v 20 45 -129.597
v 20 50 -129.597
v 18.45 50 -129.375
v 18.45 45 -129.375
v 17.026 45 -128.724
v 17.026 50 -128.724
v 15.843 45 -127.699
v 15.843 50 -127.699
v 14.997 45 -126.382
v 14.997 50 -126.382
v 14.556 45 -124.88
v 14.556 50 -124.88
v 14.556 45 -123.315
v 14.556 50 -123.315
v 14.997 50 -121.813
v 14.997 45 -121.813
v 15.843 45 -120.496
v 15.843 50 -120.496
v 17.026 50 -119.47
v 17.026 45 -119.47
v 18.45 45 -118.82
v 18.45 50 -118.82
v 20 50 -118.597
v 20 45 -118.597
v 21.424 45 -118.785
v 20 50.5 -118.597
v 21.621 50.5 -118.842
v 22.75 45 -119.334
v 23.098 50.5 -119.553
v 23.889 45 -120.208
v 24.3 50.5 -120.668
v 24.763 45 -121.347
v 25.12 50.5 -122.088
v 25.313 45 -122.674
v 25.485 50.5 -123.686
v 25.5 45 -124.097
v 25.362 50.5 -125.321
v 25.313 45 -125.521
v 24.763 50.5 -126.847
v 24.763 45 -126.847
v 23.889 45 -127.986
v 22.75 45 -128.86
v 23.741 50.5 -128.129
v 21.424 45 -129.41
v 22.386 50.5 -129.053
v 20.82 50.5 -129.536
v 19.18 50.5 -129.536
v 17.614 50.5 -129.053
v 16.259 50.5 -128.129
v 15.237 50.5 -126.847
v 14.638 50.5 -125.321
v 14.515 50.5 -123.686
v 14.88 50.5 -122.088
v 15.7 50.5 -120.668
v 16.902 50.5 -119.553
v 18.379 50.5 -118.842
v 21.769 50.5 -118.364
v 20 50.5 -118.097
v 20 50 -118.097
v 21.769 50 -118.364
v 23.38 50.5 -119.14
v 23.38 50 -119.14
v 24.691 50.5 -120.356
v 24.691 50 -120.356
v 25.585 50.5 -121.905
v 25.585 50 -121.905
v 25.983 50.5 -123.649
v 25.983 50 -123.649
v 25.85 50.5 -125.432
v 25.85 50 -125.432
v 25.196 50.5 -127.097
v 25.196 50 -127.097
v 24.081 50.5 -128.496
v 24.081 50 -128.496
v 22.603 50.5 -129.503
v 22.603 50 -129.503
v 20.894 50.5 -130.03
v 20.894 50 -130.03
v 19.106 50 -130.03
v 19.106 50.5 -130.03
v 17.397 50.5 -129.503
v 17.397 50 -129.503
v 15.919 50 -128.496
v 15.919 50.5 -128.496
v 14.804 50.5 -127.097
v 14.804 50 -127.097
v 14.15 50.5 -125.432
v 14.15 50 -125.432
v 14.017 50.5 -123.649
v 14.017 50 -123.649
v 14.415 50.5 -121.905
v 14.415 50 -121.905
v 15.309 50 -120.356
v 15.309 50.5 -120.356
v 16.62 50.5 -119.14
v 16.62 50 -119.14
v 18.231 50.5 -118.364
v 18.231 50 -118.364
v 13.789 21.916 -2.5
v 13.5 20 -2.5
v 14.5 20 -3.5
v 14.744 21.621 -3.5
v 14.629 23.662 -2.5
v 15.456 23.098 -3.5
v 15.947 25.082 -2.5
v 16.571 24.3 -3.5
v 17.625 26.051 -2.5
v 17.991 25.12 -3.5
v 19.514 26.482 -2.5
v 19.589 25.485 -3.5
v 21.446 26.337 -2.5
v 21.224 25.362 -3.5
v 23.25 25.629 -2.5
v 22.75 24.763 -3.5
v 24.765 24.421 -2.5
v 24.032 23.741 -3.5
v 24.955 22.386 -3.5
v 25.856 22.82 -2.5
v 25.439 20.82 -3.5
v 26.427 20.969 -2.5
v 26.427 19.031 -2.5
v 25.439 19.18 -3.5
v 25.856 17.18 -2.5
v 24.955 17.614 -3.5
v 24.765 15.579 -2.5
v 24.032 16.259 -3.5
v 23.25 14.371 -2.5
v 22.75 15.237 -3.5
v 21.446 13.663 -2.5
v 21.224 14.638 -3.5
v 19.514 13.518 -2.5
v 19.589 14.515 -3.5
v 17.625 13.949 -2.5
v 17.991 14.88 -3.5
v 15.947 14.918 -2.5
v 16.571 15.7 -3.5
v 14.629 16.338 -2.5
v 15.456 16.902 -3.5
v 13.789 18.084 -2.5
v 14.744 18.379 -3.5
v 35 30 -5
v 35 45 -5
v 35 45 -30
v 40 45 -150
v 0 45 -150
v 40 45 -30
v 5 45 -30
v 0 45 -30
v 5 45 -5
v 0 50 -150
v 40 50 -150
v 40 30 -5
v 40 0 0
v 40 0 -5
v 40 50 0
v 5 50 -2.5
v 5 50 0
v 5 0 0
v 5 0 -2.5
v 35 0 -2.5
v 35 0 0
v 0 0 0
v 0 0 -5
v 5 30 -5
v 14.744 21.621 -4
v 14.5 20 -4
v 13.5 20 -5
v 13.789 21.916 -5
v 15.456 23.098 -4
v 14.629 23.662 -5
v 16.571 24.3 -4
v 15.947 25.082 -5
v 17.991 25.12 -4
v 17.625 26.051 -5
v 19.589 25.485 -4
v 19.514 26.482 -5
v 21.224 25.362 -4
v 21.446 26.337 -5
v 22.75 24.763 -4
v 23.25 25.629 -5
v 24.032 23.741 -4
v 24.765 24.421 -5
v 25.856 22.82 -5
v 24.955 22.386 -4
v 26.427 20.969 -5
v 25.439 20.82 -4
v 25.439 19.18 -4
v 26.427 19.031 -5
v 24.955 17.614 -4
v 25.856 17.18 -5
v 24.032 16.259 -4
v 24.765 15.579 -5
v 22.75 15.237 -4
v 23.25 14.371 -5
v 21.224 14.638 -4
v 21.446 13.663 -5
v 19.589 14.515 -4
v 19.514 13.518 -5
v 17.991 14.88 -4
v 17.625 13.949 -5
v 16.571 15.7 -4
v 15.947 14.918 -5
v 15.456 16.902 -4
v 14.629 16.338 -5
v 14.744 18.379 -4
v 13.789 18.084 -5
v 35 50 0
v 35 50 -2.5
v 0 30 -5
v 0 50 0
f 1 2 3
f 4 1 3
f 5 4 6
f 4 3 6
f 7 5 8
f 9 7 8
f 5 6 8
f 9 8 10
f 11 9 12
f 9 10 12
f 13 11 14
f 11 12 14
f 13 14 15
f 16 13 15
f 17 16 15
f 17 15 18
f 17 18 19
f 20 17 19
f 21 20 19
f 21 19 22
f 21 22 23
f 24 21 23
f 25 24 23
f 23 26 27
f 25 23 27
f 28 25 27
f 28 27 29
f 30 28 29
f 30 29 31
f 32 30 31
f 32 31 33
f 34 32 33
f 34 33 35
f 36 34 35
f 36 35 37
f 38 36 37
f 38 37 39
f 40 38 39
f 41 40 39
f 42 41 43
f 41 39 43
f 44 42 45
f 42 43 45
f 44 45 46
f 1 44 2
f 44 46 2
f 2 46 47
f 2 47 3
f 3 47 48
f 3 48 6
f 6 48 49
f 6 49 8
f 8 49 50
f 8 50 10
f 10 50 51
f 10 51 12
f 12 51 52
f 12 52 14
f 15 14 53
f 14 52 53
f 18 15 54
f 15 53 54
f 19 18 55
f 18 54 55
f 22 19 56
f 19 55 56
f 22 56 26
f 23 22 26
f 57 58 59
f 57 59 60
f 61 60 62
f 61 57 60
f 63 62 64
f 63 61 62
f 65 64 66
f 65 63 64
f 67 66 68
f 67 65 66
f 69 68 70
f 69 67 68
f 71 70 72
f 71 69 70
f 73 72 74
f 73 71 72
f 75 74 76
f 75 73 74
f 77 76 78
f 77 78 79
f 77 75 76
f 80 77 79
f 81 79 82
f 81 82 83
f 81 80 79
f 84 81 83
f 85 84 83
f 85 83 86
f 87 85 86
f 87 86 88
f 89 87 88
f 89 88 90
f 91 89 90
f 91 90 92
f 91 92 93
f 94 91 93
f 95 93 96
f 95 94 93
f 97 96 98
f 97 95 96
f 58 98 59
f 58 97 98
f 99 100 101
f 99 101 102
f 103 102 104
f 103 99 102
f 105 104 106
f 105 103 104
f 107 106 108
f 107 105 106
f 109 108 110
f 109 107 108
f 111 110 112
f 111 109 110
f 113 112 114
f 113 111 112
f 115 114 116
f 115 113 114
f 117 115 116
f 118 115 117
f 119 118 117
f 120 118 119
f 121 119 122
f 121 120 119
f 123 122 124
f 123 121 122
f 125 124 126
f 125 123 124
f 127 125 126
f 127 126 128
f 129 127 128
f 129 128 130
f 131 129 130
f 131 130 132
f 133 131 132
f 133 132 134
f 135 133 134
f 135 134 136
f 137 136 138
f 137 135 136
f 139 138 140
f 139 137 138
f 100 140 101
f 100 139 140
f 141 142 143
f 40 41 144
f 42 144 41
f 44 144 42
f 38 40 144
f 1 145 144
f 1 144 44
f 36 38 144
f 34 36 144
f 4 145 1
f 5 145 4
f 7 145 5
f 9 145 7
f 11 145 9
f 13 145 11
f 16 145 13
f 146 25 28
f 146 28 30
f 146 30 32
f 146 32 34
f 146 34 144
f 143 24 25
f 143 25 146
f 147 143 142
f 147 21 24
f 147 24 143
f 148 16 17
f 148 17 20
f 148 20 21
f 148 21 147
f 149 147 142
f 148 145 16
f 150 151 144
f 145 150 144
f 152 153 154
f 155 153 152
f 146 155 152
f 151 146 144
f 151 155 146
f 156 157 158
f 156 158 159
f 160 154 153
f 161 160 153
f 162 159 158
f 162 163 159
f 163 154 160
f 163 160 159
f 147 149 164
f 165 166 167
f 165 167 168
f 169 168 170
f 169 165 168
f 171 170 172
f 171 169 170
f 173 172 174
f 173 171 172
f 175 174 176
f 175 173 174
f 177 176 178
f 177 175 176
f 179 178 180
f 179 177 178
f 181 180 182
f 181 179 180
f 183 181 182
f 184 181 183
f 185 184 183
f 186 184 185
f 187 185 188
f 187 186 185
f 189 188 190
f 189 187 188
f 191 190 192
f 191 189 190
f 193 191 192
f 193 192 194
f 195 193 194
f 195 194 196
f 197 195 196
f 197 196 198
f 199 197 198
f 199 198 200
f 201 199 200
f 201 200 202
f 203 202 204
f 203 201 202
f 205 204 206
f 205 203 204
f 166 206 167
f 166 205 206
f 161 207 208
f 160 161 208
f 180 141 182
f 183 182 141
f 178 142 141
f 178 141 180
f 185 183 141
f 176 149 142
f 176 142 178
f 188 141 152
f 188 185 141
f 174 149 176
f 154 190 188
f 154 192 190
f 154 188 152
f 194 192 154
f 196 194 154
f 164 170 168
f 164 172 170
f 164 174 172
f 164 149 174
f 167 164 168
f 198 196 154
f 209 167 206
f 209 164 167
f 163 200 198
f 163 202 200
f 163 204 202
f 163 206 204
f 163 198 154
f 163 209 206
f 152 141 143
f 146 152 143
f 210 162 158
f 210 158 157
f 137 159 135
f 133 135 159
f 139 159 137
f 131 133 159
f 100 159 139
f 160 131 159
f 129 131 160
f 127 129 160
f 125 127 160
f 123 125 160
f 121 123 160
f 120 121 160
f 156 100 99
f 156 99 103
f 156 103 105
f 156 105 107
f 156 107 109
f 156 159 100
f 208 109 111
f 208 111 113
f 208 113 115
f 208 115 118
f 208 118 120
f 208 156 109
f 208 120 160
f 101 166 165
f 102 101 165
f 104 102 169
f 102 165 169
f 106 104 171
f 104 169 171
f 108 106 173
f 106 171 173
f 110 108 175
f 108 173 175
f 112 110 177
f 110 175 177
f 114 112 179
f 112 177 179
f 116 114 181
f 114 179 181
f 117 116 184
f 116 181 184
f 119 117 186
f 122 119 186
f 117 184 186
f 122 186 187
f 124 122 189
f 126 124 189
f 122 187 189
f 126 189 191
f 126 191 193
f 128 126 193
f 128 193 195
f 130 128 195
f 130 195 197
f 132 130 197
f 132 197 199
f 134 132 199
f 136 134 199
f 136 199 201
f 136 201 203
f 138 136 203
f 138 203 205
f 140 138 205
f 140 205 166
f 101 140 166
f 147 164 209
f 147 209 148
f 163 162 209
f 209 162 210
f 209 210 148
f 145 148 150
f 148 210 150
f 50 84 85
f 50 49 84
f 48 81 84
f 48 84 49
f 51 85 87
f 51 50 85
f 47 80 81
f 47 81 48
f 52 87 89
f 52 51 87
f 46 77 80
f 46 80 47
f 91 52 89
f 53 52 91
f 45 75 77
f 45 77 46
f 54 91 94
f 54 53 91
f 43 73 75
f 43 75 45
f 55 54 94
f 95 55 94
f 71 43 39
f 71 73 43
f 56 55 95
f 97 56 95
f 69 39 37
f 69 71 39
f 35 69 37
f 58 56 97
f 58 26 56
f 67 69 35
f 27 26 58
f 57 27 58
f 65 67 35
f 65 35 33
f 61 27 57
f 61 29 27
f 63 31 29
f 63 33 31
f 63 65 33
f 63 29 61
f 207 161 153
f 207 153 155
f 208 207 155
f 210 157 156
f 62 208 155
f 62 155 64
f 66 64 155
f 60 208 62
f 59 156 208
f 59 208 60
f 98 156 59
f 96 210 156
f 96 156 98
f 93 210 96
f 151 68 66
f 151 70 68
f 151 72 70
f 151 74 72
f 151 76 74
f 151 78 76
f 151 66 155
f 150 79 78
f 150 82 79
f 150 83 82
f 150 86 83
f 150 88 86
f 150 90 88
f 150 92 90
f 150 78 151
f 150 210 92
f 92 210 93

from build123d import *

# Parameters (mm, degrees)
DODANIE_WYCI_GNI_CIE1_DEPTH = 40
SZKIC2_W                    = 30
SZKIC2_H                    = 2.5
WYTNIJ_WYCI_GNI_CIE1_DEPTH  = 164.095064303
EBRO3_START                 = -5
EBRO3_DEPTH                 = 5
SZKIC4_R                    = 5.5
WYTNIJ_WYCI_GNI_CIE2_DEPTH  = 10
SFAZOWANIE1_SIZE            = 1
WYTNIJ_WYCI_GNI_CIE3_DEPTH  = 10
DODANIE_WYCI_GNI_CIE2_START = 0.5
SZKIC6_R                    = 6
SZKIC6_R_2                  = 5.5
DODANIE_WYCI_GNI_CIE2_DEPTH = 0.5


# Read off the part's stored shape, not the designer's step: Żebro3
with BuildPart() as part:
    # Szkic1 → Dodanie-wyciągnięcie1 (new body)
    with BuildSketch(Plane(origin=(0, 0, 0), x_dir=(0, 0, -1), z_dir=(1, 0, 0))):
        Polygon((0, 0), (0, 50), (150, 50), (150, 45), (5, 45), (5, 0), align=None)
    extrude(amount=DODANIE_WYCI_GNI_CIE1_DEPTH)

    # Szkic2 → Wytnij-wyciągnięcie1 (cut, through all)
    with BuildSketch(Plane(origin=(0, 50, 0), x_dir=(1, 0, 0), z_dir=(0, 1, 0))):
        with Locations((20, 1.25)):
            Rectangle(SZKIC2_W, SZKIC2_H)
    extrude(amount=-WYTNIJ_WYCI_GNI_CIE1_DEPTH, mode=Mode.SUBTRACT)

    # Żebro3 outline → Żebro3 (add)
    with BuildSketch(Plane(origin=(40, 0, 0), x_dir=(0, 0, -1), z_dir=(1, 0, 0)).offset(EBRO3_START)):
        Polygon((5, 30), (30, 45), (5, 45), align=None)
    ebro3 = extrude(amount=EBRO3_DEPTH)

    # Lustro1: Żebro3 across plane
    add(ebro3.mirror(Plane(origin=(20, 0, 0), x_dir=(0, 0, 1), z_dir=(1, 0, 0))))

    # Szkic4 → Wytnij-wyciągnięcie2 (cut)
    with BuildSketch(Plane(origin=(0, 0, -5), x_dir=(-1, 0, 0), z_dir=(0, 0, -1))):
        with Locations((-20, 20)):
            Circle(SZKIC4_R)
    extrude(amount=-WYTNIJ_WYCI_GNI_CIE2_DEPTH, mode=Mode.SUBTRACT)

    # Sfazowanie1
    sfazowanie1_edges = [part.edges().sort_by_distance(p)[0] for p in [
        (25.5, 20, -2.5),
        (25.5, 20, -5),
    ]]
    chamfer(sfazowanie1_edges, length=SFAZOWANIE1_SIZE)

    # Szkic5 → Wytnij-wyciągnięcie3 (cut)
    with BuildSketch(Plane(origin=(0, 50, 0), x_dir=(1, 0, 0), z_dir=(0, 1, 0))):
        with BuildLine():
            ThreePointArc((20, 129.597336258), (14.5, 124.097336258), (20, 118.597336258))
            Line((20, 118.597336258), (20, 129.597336258))
        make_face()
        with BuildLine():
            Line((20, 129.597336258), (20, 118.597336258))
            ThreePointArc((20, 118.597336258), (23.889087297, 120.208248962), (25.5, 124.097336258))
            ThreePointArc((25.5, 124.097336258), (23.889087297, 127.986423555), (20, 129.597336258))
        make_face()
    extrude(amount=-WYTNIJ_WYCI_GNI_CIE3_DEPTH, mode=Mode.SUBTRACT)

    # Szkic6 → Dodanie-wyciągnięcie2 (add)
    with BuildSketch(Plane(origin=(0, 50, 0), x_dir=(1, 0, 0), z_dir=(0, 1, 0)).offset(DODANIE_WYCI_GNI_CIE2_START)):
        with Locations(Location((20, 124.097336258, 0), (0, 0, 270))):
            Circle(SZKIC6_R)
        with Locations(Location((20, 124.097336258, 0), (0, 0, 270))):
            Circle(SZKIC6_R_2, mode=Mode.SUBTRACT)
    extrude(amount=-DODANIE_WYCI_GNI_CIE2_DEPTH)


solid = part.part
